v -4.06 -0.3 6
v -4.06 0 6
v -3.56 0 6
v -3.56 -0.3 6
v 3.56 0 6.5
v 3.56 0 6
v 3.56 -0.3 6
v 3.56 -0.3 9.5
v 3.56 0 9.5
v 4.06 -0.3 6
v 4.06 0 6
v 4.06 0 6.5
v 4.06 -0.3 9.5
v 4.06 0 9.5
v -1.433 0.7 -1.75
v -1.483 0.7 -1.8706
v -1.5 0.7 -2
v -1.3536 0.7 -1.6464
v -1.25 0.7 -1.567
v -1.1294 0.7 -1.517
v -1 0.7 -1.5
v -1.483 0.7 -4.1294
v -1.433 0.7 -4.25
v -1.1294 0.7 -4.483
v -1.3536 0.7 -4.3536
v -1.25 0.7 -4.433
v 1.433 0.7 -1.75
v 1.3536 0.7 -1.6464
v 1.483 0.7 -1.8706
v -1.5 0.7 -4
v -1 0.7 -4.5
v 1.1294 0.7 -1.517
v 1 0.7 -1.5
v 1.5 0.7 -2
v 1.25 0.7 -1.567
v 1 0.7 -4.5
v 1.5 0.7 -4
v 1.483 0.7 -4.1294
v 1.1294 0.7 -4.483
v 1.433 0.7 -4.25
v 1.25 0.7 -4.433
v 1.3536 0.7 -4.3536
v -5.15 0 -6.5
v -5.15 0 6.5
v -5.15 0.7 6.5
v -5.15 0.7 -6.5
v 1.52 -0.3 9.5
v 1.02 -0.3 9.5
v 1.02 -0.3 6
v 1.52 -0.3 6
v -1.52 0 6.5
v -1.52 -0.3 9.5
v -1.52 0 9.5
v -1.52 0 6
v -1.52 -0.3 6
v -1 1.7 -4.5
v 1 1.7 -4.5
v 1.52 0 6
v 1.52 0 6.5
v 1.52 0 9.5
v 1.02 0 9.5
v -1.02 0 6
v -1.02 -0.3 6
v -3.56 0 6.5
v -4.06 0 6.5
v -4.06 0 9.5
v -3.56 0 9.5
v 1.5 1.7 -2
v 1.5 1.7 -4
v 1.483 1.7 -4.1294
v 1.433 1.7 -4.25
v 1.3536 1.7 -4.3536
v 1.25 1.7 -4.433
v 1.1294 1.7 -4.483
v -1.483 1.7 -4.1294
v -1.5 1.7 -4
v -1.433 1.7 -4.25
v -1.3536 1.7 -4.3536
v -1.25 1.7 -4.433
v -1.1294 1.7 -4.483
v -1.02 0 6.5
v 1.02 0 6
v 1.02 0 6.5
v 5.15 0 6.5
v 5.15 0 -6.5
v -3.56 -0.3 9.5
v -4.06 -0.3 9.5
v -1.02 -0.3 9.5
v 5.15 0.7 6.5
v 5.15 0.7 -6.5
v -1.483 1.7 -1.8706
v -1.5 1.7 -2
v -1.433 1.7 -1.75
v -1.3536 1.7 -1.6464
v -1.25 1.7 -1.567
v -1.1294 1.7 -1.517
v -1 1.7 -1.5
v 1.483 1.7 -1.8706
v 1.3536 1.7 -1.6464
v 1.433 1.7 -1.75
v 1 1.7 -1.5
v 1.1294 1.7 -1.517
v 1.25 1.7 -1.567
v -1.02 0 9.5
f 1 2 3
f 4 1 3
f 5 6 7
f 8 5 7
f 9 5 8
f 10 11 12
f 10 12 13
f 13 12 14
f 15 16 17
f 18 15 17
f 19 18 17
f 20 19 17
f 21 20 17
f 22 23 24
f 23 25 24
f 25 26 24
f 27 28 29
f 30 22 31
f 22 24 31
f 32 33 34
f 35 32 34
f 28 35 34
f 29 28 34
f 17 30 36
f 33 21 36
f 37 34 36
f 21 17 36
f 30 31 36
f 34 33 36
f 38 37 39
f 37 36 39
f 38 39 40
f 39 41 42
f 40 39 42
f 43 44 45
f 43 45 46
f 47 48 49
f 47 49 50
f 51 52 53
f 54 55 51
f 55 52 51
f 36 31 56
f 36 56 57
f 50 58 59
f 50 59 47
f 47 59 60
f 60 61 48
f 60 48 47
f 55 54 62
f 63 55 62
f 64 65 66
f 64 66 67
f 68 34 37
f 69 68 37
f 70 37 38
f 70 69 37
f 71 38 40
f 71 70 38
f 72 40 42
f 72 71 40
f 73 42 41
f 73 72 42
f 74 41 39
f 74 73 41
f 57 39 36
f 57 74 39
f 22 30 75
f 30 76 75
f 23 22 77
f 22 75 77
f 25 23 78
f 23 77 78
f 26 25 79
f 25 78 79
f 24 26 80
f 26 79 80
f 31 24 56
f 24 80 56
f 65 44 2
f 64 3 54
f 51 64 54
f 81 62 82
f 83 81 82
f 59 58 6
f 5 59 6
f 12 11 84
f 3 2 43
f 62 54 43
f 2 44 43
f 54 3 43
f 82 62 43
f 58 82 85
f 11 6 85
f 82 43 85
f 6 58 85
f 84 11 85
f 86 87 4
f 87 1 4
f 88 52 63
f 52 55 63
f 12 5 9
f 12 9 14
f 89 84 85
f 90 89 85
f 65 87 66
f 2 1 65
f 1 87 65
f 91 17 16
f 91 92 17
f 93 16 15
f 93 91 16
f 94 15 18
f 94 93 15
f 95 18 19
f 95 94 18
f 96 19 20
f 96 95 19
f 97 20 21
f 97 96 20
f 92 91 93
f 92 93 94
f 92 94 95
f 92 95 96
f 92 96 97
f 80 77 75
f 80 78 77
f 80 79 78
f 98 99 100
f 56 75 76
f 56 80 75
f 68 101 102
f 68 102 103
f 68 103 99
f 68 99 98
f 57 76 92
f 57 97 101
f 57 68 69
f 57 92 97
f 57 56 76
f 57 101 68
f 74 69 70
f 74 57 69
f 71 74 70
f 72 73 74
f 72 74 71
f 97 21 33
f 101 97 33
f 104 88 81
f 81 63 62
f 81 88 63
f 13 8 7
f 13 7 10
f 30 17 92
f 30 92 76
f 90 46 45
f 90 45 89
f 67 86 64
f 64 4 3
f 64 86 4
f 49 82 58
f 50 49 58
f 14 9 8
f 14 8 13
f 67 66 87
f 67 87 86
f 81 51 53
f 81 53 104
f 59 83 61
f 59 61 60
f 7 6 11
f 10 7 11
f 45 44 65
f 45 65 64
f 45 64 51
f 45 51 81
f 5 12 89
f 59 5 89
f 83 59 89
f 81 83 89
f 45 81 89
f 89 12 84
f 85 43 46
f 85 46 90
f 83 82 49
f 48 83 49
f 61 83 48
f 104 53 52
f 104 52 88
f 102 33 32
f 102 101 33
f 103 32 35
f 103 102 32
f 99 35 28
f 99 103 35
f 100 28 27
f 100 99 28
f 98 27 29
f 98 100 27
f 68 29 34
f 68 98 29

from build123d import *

# Parameters (mm, degrees)
SKETCH_1_W             = 10.3
SKETCH_1_H             = 13
EXTRUDE_1_DEPTH        = 0.7
SKETCH_2_W             = 3
SKETCH_2_H             = 3
EXTRUDE_2_DEPTH        = 1
FILLET_1_R             = 0.5
SKETCH_3_W             = 0.5
SKETCH_3_H             = 0.5
EXTRUDE_3_DEPTH        = 0.3
SKETCH_4_W             = 0.5
SKETCH_4_H             = 0.3
EXTRUDE_4_DEPTH        = 3
PATTERN_LINEAR_1_COUNT = 4
PATTERN_LINEAR_1_PITCH = 2.54


with BuildPart() as part:
    # Эскиз1 → Бобышка-Вытянуть1 (new body)
    with BuildSketch(Plane(origin=(0, 0, 0), x_dir=(1, 0, 0), z_dir=(0, 1, 0))):
        Rectangle(SKETCH_1_W, SKETCH_1_H)
    extrude(amount=EXTRUDE_1_DEPTH)



with BuildPart() as body_2:
    # Эскиз2 → Бобышка-Вытянуть2 (new body)
    with BuildSketch(Plane(origin=(0, 0.7, 0), x_dir=(1, 0, 0), z_dir=(0, 1, 0))):
        with Locations((0, 3)):
            Rectangle(SKETCH_2_W, SKETCH_2_H)
    extrude(amount=EXTRUDE_2_DEPTH)

    # Скругление1
    fillet_1_edges = [body_2.edges().sort_by_distance(p)[0] for p in [
        (1.5, 1.2, -1.5),
        (-1.5, 1.2, -1.5),
        (-1.5, 1.2, -4.5),
        (1.5, 1.2, -4.5),
    ]]
    fillet(fillet_1_edges, radius=FILLET_1_R)


with BuildPart() as body_3:
    # Эскиз3 → Бобышка-Вытянуть3 (new body)
    with BuildSketch(Plane.XZ):
        with Locations((-3.81, 6.25)):
            Rectangle(SKETCH_3_W, SKETCH_3_H)
    extrude_3 = extrude(amount=EXTRUDE_3_DEPTH)


with BuildPart() as part_1:
    add(part.part)

    add(body_3.part)  # Бобышка-Вытянуть4 merges body 3
    # Эскиз4 → Бобышка-Вытянуть4 (add)
    with BuildSketch(Plane.XY.offset(6.5)):
        with Locations((-3.81, -0.15)):
            Rectangle(SKETCH_4_W, SKETCH_4_H)
    extrude_4 = extrude(amount=EXTRUDE_4_DEPTH)

    # Линейный массив1: Бобышка-Вытянуть3, Бобышка-Вытянуть4 ×4
    with Locations(*[(i * PATTERN_LINEAR_1_PITCH, 0, 0) for i in range(1, PATTERN_LINEAR_1_COUNT)]):
        add(extrude_3)
        add(extrude_4)


solid = Compound([body_2.part, part_1.part])
